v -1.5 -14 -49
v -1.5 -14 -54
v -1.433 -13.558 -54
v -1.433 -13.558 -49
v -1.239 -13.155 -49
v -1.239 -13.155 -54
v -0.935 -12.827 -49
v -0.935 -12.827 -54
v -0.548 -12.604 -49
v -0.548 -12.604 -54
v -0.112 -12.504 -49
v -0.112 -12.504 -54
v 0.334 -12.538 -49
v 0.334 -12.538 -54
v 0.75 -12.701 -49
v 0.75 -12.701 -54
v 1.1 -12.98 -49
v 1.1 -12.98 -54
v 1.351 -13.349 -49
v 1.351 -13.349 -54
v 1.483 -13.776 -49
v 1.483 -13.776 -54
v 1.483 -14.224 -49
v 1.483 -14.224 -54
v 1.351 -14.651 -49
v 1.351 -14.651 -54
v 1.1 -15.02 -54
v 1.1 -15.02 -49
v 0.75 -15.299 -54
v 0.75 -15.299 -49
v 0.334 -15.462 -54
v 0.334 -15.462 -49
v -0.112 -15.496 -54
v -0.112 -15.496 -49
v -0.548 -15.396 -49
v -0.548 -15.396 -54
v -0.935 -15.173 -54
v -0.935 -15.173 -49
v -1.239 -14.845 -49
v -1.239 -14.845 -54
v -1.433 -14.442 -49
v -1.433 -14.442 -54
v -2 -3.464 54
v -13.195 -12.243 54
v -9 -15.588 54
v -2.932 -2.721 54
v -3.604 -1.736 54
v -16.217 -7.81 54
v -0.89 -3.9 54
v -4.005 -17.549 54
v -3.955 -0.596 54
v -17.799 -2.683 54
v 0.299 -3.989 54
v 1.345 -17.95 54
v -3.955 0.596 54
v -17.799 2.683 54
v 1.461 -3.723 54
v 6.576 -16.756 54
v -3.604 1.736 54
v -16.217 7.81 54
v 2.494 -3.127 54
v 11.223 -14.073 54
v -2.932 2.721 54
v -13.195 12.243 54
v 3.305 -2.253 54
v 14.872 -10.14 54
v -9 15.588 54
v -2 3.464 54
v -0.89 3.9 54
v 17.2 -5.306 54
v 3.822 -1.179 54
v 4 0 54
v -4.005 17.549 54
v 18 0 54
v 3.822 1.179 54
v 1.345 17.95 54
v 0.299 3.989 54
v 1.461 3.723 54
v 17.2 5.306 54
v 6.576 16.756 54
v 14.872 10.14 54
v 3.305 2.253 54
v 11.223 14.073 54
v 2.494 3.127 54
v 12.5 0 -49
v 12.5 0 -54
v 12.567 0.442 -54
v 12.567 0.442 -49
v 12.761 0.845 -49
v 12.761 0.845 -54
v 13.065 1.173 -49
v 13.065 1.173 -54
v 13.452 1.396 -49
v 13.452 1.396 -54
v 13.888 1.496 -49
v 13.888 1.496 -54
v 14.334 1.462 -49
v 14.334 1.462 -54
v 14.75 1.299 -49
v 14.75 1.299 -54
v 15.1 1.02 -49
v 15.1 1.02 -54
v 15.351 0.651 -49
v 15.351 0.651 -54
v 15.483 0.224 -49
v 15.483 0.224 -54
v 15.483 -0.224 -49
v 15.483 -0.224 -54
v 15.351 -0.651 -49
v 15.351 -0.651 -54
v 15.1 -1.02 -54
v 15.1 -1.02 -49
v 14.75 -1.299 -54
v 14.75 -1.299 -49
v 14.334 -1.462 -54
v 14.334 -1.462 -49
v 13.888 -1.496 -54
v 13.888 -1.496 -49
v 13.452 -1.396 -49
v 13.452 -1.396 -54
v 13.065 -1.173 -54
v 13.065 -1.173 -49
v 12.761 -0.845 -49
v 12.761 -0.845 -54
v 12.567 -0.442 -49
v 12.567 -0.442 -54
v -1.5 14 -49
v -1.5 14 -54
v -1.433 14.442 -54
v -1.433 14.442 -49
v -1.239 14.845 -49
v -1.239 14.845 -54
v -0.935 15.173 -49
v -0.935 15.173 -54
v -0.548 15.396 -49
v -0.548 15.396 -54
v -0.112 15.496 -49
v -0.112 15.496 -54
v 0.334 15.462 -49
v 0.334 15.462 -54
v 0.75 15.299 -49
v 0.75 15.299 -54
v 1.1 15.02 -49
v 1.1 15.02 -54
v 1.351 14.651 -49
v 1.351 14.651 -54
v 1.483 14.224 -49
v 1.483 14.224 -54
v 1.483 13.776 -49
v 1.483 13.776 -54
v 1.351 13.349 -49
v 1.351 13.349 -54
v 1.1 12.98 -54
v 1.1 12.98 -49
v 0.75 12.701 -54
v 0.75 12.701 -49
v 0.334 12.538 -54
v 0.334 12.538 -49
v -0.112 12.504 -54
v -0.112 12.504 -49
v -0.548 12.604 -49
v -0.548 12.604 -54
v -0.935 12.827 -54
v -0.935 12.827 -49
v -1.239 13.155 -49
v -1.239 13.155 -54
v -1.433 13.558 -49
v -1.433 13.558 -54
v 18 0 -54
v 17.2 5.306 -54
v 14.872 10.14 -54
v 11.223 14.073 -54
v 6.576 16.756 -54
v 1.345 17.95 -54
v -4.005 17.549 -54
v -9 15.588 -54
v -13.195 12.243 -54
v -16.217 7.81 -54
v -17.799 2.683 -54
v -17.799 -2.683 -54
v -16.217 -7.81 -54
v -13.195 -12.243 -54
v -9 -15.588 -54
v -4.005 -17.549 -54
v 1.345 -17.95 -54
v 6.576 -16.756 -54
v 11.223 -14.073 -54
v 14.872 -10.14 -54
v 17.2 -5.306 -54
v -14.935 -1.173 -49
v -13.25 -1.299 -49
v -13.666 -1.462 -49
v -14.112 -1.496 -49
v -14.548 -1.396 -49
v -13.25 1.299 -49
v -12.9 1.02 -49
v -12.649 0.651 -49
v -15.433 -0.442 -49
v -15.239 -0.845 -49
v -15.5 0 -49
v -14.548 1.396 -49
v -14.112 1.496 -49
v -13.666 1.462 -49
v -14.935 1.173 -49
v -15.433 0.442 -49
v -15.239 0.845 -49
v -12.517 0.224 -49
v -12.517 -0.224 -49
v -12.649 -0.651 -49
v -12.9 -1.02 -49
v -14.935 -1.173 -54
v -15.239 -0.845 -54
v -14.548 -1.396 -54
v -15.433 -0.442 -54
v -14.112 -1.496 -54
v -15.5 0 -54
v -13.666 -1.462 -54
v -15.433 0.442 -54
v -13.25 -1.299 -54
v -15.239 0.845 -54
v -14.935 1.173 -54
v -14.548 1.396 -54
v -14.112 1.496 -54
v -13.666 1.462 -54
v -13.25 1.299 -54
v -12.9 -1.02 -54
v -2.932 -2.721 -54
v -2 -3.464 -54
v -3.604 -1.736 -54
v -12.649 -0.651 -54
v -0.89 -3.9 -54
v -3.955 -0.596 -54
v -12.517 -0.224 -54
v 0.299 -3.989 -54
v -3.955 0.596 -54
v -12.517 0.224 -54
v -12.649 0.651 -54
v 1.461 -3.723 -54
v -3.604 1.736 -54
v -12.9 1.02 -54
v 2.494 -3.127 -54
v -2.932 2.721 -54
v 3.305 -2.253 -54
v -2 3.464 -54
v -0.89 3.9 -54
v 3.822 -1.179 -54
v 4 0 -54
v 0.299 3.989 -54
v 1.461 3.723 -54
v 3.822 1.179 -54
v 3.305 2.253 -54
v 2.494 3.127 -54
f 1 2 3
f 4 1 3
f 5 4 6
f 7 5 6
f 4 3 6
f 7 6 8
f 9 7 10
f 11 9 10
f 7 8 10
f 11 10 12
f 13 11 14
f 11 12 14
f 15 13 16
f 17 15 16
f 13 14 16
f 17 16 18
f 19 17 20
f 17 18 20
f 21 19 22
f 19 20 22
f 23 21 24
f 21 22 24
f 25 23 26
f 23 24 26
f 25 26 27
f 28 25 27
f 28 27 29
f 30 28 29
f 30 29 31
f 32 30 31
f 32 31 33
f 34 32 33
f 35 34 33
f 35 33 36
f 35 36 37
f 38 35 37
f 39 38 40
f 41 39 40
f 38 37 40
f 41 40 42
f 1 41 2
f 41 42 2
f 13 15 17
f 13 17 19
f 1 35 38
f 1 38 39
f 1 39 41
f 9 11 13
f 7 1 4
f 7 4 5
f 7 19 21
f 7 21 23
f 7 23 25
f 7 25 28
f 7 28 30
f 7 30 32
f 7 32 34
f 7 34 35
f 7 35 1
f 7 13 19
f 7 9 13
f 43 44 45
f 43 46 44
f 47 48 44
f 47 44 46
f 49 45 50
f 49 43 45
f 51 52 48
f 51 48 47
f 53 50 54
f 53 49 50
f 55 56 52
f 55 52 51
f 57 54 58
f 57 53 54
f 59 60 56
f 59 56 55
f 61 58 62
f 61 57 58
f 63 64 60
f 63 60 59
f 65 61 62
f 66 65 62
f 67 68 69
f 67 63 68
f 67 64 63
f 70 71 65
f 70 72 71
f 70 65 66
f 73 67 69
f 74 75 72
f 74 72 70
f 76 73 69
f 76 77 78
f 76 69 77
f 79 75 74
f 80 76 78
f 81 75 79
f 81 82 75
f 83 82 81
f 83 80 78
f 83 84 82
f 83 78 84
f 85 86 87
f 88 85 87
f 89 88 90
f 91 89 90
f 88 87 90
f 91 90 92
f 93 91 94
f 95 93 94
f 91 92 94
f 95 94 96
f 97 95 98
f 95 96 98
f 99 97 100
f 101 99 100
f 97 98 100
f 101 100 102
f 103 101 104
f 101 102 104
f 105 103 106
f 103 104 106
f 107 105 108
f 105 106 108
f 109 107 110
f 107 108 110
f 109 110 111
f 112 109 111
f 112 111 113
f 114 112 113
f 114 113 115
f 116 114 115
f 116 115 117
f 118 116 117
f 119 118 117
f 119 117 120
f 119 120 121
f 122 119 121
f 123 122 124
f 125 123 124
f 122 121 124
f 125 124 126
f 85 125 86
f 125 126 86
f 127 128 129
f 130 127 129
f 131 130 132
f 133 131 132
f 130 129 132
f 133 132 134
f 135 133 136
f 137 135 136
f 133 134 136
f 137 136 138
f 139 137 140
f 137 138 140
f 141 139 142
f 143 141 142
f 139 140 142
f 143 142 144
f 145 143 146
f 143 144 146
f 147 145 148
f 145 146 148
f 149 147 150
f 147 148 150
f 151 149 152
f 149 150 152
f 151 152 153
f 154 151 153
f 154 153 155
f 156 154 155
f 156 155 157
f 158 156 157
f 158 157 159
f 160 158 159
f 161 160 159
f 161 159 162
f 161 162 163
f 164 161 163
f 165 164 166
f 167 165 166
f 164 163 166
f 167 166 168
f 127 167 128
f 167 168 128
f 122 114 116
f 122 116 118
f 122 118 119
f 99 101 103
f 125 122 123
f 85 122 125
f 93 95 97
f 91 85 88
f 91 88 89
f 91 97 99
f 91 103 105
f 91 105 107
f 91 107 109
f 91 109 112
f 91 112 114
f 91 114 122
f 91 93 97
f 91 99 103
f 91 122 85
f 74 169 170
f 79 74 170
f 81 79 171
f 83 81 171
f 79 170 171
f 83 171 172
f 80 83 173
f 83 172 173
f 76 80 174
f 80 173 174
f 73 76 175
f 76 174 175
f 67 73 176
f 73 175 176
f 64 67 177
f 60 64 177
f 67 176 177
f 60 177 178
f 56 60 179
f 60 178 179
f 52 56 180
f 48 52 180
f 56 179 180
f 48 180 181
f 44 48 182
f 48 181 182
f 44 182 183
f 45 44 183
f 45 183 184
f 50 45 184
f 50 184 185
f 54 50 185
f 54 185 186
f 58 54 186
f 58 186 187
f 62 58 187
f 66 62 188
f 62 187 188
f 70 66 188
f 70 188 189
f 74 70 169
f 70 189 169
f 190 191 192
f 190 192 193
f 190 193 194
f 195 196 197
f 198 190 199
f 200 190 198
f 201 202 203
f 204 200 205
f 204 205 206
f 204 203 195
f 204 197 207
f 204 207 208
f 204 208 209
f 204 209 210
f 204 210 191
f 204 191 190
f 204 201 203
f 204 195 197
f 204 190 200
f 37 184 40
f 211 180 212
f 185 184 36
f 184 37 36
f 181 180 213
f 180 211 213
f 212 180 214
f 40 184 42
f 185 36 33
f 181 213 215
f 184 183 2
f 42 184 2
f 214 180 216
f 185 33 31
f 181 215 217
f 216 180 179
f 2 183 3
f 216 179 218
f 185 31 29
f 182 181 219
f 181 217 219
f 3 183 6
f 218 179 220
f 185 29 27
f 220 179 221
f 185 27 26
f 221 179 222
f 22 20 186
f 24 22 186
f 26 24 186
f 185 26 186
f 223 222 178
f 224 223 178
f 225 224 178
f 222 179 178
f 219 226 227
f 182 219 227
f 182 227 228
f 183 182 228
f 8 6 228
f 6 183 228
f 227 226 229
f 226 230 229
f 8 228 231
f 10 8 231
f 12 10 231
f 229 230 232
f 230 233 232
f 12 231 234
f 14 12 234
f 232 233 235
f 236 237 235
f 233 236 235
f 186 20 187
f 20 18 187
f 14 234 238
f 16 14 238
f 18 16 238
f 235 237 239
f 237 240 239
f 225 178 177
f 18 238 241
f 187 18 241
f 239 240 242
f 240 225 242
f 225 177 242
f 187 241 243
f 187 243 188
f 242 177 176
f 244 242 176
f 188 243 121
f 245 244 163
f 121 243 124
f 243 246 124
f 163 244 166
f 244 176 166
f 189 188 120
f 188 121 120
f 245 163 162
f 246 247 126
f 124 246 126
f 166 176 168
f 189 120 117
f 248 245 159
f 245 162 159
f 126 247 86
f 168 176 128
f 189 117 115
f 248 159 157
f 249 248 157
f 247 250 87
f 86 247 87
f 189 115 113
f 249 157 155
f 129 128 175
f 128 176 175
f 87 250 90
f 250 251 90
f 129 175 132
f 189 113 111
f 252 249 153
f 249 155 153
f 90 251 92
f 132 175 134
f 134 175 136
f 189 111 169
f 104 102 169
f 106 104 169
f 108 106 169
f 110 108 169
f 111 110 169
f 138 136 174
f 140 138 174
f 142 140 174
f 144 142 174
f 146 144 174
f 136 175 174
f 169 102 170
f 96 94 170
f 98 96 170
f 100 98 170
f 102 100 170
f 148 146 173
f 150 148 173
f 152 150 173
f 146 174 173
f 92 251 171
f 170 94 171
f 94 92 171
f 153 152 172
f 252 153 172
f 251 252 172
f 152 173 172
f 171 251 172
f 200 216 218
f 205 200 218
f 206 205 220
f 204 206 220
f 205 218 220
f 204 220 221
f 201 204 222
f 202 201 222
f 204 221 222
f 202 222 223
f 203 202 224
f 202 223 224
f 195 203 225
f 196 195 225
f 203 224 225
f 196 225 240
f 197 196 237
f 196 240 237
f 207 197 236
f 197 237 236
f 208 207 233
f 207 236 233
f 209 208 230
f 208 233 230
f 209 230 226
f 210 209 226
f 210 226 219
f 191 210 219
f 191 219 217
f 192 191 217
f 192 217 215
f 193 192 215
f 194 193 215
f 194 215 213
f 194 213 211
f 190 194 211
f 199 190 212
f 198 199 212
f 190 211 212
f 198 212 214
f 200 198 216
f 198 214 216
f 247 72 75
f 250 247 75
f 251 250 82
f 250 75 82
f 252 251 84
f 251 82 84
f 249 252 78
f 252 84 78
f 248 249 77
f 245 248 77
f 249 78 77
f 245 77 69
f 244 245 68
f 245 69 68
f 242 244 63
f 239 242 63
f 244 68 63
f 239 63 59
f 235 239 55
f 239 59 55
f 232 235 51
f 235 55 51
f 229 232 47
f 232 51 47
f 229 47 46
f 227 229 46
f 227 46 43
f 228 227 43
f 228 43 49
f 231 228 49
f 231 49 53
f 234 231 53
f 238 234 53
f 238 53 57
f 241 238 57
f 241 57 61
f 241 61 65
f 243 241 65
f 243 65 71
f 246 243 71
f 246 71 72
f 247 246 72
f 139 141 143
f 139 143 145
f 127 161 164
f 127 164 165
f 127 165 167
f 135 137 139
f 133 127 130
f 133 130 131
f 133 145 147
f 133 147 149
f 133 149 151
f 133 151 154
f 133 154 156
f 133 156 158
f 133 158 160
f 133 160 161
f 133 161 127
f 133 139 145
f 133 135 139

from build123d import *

# Parameters (mm, degrees)
BOSS_EXTRUDE1_DEPTH      = 54
BOSS_EXTRUDE1_DEPTH_BACK = 54
SKETCH2_R                = 18
SKETCH3_R                = 4
CUT_EXTRUDE1_DEPTH       = 122
SKETCH4_R                = 1.5
CUT_EXTRUDE2_DEPTH       = 5


with BuildPart() as part:
    # Sketch2 → Boss-Extrude1 (new, two sides: drawn at the far end of the back side and taken through both)
    with BuildSketch(Plane.XY.offset(-BOSS_EXTRUDE1_DEPTH_BACK)):
        Circle(SKETCH2_R)
    extrude(amount=BOSS_EXTRUDE1_DEPTH + BOSS_EXTRUDE1_DEPTH_BACK)

    # Sketch3 → Cut-Extrude1 (cut)
    with BuildSketch(Plane.XY.offset(54)):
        Circle(SKETCH3_R)
    extrude(amount=-CUT_EXTRUDE1_DEPTH, mode=Mode.SUBTRACT)

    # Sketch4 → Cut-Extrude2 (cut)
    with BuildSketch(Plane(origin=(0, 0, -54), x_dir=(-1, 0, 0), z_dir=(0, 0, -1))):
        with Locations((0, 14)):
            Circle(SKETCH4_R)
        with Locations((14, 0)):
            Circle(SKETCH4_R)
        with Locations((0, -14)):
            Circle(SKETCH4_R)
        with Locations((-14, 0)):
            Circle(SKETCH4_R)
    extrude(amount=-CUT_EXTRUDE2_DEPTH, mode=Mode.SUBTRACT)


solid = part.part
